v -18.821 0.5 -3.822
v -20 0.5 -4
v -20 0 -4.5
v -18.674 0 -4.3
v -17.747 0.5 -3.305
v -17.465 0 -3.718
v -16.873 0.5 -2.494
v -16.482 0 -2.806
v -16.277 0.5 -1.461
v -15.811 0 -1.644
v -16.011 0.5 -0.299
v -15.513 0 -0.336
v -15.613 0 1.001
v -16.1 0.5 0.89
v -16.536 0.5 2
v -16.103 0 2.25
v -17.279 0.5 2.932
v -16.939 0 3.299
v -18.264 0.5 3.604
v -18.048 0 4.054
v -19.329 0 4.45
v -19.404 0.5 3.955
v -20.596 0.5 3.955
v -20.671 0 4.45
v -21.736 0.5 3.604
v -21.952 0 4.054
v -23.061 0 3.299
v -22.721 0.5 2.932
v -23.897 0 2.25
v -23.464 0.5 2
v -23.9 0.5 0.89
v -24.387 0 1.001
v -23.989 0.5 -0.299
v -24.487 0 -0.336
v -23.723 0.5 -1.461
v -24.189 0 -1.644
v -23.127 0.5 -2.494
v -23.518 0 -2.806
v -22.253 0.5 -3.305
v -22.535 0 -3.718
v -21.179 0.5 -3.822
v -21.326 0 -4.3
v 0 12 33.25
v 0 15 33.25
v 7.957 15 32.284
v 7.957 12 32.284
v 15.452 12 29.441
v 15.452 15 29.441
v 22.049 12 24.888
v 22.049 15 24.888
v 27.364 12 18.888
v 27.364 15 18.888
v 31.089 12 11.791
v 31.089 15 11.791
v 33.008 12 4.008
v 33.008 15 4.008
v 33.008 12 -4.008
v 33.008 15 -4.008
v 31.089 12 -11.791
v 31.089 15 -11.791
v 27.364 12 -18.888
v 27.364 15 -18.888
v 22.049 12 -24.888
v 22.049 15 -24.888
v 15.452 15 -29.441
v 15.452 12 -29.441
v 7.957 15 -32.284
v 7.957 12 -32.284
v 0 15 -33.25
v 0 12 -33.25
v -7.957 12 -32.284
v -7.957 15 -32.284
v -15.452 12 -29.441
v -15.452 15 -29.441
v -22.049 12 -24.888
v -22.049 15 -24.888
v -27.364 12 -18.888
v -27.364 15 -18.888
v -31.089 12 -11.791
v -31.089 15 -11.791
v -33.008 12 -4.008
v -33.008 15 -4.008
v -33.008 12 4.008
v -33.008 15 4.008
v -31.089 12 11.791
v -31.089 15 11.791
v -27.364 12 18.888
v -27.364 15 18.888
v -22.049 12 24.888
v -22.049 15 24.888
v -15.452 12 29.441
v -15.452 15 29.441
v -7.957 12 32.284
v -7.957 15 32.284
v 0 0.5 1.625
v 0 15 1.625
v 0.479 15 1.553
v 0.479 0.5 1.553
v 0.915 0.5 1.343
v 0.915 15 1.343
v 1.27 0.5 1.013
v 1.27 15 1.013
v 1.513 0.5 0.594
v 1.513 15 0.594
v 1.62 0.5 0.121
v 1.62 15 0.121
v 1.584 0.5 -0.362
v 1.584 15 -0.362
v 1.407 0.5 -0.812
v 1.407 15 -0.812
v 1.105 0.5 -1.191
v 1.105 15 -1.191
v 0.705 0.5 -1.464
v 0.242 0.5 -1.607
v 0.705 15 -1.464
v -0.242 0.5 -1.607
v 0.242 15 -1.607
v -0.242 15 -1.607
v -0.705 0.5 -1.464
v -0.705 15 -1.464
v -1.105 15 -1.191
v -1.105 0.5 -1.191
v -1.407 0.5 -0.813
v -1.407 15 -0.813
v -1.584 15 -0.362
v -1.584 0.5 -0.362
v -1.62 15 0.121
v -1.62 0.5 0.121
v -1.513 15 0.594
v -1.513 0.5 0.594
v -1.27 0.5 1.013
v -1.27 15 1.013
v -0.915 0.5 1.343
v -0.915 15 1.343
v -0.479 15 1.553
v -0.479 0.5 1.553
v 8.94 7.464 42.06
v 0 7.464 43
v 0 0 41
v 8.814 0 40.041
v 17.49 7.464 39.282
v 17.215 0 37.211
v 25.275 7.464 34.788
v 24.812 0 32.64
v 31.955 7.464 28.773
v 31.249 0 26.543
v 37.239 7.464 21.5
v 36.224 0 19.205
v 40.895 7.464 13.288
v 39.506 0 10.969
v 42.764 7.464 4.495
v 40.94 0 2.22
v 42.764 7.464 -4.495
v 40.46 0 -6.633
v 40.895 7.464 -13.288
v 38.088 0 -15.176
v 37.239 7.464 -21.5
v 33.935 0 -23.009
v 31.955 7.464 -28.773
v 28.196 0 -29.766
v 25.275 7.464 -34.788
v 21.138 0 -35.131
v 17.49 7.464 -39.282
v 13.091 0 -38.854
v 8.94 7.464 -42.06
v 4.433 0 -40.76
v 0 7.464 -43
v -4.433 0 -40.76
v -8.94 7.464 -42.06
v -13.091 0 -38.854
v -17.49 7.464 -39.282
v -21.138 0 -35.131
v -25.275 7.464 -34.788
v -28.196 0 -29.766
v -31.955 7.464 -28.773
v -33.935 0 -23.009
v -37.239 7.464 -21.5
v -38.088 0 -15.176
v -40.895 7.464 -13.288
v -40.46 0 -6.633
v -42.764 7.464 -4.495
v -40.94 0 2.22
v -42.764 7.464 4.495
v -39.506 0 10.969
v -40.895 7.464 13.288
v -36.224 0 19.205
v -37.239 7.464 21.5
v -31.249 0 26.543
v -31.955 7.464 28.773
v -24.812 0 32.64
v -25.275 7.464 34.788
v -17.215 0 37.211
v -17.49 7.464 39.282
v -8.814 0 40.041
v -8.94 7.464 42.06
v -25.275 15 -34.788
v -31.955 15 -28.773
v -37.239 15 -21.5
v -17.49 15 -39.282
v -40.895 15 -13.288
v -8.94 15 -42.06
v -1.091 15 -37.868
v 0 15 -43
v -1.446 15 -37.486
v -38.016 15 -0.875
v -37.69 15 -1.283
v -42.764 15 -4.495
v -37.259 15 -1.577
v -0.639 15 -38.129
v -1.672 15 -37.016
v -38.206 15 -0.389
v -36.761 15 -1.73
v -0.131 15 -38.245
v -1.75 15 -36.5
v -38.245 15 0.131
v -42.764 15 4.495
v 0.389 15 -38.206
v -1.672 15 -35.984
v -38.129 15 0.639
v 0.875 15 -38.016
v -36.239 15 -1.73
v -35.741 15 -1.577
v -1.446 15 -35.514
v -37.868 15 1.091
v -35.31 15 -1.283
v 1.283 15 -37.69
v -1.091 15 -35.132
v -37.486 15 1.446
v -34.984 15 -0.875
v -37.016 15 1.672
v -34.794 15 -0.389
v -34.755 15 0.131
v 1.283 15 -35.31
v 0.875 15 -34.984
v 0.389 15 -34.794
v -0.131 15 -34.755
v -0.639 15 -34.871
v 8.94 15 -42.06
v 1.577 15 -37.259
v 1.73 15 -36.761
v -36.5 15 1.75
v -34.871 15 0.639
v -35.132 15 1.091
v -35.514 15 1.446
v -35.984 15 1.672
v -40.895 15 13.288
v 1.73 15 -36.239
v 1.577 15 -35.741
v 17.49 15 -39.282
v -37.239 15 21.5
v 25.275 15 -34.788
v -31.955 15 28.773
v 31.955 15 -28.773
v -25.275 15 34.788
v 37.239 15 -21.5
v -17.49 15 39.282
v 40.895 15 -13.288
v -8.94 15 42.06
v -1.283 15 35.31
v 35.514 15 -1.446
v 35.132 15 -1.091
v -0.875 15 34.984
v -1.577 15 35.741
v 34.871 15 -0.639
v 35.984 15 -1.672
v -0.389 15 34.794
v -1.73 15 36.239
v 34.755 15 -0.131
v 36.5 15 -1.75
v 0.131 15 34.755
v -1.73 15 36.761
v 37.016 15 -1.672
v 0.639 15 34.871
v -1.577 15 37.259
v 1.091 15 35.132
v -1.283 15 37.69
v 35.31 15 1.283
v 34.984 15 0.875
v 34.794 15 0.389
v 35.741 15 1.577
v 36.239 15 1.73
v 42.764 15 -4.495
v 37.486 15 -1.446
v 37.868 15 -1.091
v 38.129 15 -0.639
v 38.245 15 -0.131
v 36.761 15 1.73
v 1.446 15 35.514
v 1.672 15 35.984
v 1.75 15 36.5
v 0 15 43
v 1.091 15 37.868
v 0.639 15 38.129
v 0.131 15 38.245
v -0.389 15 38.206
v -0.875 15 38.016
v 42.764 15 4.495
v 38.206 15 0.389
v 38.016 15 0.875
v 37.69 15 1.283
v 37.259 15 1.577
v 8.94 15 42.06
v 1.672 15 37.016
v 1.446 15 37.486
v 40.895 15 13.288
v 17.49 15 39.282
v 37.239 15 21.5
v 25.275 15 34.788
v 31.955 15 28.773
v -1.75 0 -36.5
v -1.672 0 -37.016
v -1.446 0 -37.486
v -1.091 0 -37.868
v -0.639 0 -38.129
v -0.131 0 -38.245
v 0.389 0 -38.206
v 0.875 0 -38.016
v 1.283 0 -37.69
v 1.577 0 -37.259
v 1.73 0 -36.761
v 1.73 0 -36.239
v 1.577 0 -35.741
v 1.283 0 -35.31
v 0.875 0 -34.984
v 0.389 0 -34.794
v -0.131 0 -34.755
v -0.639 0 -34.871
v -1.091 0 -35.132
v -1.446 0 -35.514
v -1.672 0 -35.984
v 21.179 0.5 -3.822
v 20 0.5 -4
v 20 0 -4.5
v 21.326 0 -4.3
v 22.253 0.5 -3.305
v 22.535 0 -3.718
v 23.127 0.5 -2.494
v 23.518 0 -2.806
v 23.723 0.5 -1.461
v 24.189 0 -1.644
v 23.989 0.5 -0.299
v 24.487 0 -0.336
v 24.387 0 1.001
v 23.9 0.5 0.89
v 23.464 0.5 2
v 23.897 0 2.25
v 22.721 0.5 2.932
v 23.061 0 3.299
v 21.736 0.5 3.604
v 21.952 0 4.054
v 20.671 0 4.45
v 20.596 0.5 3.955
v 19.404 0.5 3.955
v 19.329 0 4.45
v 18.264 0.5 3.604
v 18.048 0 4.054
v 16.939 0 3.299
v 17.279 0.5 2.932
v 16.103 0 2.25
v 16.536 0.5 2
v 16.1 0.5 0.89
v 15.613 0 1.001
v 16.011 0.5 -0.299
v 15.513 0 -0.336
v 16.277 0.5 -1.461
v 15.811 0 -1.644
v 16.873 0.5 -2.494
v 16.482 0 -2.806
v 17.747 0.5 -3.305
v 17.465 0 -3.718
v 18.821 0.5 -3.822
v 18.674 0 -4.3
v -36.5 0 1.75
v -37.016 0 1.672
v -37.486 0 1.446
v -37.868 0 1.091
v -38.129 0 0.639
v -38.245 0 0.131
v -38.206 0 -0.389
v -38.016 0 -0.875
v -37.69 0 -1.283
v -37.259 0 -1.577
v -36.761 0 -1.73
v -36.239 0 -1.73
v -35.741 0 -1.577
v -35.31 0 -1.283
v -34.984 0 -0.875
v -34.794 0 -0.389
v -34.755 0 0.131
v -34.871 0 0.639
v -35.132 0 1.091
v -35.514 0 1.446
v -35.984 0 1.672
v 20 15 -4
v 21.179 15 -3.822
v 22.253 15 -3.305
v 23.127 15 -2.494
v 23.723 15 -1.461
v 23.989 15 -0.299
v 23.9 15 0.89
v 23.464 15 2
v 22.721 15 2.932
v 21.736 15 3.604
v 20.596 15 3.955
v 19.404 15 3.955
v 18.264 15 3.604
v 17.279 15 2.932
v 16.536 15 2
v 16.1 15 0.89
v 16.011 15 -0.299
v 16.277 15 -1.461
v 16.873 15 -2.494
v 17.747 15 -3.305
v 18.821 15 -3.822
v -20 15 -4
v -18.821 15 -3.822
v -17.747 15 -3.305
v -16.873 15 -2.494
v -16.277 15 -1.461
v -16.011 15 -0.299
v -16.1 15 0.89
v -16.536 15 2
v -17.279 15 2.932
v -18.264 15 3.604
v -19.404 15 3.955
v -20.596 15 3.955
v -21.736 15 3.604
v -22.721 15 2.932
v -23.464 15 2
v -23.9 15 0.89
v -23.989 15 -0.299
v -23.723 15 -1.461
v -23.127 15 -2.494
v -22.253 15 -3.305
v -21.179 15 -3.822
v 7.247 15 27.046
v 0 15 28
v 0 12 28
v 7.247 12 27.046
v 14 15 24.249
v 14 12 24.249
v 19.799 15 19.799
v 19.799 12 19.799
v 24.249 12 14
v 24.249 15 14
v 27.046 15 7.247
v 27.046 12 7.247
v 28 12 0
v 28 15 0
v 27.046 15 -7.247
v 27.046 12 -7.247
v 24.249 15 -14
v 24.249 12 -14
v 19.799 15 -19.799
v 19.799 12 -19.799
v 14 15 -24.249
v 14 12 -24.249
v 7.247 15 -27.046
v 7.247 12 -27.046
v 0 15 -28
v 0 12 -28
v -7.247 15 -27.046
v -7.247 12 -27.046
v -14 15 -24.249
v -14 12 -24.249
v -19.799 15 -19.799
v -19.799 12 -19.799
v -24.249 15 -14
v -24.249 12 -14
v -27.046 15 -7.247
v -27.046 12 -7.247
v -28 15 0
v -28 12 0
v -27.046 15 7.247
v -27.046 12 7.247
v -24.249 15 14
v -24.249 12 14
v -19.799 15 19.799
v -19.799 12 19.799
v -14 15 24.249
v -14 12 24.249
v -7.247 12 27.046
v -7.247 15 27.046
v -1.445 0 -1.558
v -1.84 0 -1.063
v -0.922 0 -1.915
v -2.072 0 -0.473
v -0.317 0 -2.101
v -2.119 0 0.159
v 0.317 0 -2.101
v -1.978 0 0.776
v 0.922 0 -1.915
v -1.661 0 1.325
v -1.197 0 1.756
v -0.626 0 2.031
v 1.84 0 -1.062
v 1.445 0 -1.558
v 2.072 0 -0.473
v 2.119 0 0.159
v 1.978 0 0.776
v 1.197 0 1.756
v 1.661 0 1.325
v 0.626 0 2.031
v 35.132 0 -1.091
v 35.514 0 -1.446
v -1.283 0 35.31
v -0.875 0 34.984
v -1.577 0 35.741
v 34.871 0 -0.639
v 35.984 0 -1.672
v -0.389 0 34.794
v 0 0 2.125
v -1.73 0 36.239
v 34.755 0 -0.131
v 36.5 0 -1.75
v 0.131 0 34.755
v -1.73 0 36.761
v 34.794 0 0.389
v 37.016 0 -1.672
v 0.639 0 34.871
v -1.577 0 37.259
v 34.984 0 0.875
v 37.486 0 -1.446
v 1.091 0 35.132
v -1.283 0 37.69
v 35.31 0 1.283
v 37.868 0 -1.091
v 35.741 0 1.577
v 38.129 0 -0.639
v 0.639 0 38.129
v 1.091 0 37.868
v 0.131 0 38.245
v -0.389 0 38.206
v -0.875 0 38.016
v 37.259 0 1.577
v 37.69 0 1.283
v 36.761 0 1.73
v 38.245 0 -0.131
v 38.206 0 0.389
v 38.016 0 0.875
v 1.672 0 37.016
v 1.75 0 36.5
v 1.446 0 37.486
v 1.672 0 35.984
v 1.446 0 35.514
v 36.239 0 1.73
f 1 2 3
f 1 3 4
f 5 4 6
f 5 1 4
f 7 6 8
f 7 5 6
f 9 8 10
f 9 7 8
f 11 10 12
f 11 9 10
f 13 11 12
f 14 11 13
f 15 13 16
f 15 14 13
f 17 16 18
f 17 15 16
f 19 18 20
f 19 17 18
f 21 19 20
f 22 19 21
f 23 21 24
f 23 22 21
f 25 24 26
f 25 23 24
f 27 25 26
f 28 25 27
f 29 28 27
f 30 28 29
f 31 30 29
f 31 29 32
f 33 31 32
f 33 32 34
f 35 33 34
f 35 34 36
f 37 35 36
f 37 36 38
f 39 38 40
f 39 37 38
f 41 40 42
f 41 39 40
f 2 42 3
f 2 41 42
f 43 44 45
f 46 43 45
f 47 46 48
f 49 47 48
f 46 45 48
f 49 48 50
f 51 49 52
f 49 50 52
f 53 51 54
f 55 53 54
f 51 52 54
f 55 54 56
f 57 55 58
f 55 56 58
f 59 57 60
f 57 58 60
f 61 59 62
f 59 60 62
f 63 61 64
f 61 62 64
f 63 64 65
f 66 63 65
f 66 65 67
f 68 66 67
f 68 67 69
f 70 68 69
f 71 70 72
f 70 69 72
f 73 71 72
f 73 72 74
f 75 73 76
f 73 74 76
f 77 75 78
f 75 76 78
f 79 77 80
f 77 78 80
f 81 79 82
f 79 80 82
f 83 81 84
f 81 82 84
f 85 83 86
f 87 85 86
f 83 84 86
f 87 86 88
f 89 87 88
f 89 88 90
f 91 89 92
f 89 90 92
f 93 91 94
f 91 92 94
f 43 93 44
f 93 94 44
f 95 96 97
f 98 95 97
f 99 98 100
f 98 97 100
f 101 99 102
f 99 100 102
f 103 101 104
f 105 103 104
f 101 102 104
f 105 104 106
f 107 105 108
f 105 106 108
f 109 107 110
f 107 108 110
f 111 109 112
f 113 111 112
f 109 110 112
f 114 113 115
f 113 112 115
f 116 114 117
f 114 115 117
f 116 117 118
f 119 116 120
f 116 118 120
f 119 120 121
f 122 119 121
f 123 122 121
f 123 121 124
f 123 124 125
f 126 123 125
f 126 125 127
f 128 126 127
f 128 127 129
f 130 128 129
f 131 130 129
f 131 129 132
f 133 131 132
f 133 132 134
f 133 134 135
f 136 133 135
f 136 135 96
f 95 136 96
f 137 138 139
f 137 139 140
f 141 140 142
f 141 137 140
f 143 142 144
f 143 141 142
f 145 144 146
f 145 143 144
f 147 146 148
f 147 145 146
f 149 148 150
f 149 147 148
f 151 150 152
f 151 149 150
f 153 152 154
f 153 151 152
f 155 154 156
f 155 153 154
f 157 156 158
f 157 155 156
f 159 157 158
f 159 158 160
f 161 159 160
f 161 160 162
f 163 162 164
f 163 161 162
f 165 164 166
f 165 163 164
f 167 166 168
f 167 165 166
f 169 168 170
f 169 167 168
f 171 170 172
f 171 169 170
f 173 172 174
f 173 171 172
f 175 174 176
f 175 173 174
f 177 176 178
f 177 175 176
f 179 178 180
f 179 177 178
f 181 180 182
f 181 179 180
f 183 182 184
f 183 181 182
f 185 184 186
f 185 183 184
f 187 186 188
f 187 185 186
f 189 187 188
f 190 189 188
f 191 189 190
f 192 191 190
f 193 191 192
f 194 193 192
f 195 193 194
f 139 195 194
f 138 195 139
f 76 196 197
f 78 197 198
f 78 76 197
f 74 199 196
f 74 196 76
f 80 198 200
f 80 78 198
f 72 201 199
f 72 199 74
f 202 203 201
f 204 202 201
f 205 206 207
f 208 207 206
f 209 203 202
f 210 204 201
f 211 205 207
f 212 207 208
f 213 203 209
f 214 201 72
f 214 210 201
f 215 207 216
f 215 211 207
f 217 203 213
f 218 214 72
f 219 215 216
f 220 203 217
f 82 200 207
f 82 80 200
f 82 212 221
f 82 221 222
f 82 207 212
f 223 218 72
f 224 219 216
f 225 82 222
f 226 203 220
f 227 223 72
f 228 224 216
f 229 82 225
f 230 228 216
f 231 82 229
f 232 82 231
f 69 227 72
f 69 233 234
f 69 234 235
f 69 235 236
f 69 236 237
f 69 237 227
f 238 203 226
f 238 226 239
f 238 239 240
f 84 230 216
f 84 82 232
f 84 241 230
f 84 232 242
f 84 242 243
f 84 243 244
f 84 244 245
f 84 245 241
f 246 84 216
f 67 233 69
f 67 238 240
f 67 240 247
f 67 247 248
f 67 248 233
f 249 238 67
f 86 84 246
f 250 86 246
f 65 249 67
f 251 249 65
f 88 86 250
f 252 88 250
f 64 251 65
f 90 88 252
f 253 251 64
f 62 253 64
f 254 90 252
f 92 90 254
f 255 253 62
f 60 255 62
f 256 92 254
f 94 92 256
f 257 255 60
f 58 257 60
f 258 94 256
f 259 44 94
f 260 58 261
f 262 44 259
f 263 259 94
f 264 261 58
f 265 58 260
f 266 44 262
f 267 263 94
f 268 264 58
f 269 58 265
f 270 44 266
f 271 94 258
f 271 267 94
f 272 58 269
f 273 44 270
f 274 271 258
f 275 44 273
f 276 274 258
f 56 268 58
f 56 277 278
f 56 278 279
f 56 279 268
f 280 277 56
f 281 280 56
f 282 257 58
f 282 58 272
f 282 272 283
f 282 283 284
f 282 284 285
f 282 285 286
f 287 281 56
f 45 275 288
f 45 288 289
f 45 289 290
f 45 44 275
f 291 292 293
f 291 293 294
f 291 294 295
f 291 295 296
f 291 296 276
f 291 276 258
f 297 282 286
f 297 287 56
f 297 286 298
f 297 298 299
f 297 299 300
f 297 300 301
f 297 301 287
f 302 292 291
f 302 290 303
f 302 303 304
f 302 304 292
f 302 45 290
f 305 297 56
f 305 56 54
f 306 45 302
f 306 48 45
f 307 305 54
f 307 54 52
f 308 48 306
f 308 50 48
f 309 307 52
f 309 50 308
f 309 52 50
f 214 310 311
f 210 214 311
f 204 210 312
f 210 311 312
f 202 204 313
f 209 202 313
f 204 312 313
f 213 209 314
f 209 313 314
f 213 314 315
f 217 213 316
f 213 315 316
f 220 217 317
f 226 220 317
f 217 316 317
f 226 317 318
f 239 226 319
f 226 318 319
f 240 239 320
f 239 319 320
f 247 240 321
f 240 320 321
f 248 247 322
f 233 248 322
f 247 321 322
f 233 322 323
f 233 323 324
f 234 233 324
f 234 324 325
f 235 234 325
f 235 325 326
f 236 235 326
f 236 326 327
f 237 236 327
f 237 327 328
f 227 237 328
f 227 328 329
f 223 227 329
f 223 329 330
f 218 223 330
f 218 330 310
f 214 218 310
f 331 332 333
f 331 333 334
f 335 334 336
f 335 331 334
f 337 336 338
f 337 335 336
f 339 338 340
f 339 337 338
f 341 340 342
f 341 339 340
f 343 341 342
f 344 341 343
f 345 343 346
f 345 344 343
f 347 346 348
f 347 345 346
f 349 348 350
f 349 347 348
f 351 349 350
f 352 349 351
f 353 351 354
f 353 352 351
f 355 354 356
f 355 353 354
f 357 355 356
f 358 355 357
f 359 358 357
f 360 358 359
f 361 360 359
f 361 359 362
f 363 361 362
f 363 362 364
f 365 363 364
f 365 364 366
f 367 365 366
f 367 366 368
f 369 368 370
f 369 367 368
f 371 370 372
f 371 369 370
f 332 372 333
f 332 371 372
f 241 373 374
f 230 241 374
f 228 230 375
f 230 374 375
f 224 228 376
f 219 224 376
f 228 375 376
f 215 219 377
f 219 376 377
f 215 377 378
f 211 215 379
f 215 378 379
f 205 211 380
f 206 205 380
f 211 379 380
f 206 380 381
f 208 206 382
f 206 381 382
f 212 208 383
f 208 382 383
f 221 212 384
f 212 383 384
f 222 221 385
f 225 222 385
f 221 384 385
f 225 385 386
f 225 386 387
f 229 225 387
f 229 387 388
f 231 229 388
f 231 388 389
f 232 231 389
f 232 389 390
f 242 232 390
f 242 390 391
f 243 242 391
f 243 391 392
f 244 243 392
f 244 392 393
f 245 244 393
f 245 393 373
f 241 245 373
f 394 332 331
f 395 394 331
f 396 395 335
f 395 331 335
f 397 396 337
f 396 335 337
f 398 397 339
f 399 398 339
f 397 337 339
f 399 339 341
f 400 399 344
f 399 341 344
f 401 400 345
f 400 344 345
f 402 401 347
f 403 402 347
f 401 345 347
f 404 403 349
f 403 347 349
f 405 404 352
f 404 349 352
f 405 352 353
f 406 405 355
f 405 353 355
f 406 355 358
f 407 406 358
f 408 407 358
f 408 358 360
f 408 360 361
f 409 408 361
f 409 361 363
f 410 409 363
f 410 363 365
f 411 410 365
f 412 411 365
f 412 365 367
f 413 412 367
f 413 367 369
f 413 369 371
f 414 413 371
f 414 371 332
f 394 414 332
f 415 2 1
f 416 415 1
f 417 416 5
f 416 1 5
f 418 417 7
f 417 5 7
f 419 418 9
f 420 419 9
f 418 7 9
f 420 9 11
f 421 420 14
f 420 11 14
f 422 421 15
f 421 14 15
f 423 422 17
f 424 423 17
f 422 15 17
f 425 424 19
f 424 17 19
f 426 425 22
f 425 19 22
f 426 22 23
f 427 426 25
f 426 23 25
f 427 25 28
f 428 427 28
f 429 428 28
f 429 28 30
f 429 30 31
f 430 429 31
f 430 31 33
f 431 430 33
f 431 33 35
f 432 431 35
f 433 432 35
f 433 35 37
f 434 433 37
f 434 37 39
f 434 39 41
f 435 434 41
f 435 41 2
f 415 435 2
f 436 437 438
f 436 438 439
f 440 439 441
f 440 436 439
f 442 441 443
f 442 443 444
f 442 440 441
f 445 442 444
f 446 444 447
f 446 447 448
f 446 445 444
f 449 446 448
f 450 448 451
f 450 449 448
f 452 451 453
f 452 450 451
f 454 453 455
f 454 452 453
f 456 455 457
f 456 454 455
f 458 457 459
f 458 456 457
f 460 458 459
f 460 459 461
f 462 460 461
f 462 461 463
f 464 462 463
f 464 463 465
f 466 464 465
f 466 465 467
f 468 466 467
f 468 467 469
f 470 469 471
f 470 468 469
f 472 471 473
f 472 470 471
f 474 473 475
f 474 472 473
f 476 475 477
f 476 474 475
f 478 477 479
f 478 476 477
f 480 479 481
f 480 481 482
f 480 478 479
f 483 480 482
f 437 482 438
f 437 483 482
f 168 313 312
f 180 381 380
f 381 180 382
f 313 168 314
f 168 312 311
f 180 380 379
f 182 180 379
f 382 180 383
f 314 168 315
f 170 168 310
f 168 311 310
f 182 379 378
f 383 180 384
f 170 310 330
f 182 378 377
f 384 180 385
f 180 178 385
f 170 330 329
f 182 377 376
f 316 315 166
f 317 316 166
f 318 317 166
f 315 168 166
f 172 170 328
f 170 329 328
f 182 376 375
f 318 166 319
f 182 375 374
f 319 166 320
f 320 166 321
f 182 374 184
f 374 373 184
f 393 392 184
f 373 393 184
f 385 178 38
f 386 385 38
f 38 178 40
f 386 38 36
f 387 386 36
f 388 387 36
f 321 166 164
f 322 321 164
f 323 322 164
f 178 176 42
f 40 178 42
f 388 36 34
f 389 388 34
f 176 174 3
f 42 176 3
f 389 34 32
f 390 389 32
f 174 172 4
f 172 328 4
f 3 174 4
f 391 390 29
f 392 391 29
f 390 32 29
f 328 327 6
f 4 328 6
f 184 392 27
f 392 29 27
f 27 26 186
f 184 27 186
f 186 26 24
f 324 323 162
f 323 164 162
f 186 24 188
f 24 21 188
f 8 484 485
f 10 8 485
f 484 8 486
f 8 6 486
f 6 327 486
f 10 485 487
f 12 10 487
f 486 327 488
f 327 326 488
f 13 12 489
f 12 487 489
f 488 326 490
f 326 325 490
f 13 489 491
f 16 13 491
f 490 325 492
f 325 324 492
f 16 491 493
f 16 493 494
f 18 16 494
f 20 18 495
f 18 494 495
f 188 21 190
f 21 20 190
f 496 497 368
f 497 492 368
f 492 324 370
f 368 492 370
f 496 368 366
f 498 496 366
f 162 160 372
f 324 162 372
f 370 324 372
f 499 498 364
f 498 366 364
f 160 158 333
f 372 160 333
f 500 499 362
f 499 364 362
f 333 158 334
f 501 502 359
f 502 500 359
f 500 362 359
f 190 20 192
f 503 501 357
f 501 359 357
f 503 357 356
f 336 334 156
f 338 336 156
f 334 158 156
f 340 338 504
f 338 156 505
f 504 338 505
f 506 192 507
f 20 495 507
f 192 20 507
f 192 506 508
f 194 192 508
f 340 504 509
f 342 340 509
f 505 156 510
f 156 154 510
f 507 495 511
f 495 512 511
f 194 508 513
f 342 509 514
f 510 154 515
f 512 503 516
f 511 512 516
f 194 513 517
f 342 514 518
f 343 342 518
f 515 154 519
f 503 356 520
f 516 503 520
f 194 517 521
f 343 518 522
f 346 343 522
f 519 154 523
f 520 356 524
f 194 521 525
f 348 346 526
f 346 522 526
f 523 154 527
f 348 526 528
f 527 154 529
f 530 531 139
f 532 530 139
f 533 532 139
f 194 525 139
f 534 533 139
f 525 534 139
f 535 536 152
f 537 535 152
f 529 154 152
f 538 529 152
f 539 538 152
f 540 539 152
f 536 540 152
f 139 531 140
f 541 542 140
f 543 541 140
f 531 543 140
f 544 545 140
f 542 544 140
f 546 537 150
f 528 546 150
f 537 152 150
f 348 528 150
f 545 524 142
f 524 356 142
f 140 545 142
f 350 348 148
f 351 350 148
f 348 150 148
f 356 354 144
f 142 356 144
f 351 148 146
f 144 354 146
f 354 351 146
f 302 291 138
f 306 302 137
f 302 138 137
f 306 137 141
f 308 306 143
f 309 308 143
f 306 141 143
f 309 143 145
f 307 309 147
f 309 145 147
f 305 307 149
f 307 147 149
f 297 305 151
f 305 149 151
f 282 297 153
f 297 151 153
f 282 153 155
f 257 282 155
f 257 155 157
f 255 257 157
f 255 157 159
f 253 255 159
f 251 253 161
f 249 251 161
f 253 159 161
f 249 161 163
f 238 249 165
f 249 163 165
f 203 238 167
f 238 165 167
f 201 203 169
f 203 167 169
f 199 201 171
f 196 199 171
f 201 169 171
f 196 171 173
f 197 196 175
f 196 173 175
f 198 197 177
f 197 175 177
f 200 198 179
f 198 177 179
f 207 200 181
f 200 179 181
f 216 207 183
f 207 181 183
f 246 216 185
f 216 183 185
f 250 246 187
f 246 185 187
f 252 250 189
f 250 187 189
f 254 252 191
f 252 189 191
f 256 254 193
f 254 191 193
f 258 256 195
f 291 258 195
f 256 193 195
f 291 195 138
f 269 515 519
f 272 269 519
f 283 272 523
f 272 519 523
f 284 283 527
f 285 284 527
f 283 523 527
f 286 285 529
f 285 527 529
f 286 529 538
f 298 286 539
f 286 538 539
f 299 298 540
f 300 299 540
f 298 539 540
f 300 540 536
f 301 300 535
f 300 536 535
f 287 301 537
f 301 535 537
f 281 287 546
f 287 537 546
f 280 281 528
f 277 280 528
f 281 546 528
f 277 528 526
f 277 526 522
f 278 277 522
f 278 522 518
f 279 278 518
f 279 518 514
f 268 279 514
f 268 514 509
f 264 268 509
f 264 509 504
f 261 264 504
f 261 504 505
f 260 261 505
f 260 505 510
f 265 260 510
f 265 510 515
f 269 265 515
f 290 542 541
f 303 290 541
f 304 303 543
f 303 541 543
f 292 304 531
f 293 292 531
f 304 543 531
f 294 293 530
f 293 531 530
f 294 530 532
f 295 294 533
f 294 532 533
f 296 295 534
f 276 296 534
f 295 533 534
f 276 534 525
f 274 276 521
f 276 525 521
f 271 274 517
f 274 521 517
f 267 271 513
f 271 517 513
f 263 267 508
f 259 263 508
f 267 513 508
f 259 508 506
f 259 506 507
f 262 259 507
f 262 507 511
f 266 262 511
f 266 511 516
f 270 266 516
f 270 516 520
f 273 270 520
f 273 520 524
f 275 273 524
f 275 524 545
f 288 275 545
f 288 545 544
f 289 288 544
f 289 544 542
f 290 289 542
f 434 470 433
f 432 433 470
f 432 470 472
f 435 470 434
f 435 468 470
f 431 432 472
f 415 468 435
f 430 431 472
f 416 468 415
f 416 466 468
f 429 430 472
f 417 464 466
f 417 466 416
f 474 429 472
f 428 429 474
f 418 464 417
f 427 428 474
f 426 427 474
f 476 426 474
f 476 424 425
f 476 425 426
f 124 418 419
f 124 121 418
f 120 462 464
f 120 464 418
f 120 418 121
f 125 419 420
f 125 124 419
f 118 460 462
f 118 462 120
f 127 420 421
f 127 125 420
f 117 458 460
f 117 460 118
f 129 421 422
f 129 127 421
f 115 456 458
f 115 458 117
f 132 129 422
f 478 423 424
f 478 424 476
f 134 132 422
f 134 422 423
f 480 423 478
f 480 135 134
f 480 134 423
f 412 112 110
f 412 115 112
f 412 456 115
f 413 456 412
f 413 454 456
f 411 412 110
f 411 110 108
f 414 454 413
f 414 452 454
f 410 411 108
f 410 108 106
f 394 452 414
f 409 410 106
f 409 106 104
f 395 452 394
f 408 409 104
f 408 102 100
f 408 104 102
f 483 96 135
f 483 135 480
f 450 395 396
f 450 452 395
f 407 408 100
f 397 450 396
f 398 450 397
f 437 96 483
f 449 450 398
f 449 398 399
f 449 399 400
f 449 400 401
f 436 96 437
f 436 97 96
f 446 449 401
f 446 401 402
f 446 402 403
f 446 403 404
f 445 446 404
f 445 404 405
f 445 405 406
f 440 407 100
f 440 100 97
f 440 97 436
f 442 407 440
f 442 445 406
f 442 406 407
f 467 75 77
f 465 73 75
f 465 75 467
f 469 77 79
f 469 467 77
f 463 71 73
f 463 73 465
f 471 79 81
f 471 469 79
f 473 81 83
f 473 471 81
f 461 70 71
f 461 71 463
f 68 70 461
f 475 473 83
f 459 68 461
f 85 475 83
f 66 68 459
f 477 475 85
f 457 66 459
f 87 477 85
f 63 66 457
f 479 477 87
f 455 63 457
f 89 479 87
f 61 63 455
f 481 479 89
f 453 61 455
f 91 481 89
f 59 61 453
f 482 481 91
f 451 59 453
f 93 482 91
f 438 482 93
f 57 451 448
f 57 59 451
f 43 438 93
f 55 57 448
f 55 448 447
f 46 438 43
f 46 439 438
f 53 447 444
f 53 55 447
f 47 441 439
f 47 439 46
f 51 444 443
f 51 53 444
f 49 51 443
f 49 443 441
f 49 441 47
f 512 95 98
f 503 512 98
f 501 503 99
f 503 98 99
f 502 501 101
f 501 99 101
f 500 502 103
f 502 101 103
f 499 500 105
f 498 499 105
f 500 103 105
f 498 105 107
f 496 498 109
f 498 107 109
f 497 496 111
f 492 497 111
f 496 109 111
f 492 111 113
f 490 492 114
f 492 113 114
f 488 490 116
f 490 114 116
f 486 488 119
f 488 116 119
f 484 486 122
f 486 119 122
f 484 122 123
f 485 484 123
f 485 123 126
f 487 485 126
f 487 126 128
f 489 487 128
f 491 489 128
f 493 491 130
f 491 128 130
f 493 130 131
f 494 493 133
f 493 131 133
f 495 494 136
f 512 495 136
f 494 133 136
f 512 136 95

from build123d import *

# Parameters (mm, degrees)
SKETCH1_R           = 43
BOSS_EXTRUDE1_DEPTH = 15
SKETCH2_R           = 4
CUT_EXTRUDE1_DEPTH  = 63.633856659
SKETCH3_R           = 1.625
CUT_EXTRUDE2_DEPTH  = 63.633856659
SKETCH4_R           = 33.25
SKETCH4_R_2         = 28
CUT_EXTRUDE3_DEPTH  = 3
SKETCH5_R           = 1.75
CUT_EXTRUDE4_DEPTH  = 63.633856659
CIRPATTERN1_COUNT   = 4
CHAMFER1_SIZE       = 2
CHAMFER1_SIZE2      = 7.464101615
CHAMFER2_SIZE       = 0.5


with BuildPart() as part:
    # Sketch1 → Boss-Extrude1 (new body)
    with BuildSketch(Plane(origin=(0, 0, 0), x_dir=(1, 0, 0), z_dir=(0, 1, 0))):
        with Locations(Location((0, 0, 0), (0, 0, 270))):
            Circle(SKETCH1_R)
    extrude(amount=BOSS_EXTRUDE1_DEPTH)

    # Sketch2 → Cut-Extrude1 (cut, through all)
    with BuildSketch(Plane.XZ):
        with Locations(Location((20, 0, 0), (0, 0, 270))):
            Circle(SKETCH2_R)
        with Locations(Location((-20, 0, 0), (0, 0, 270))):
            Circle(SKETCH2_R)
    extrude(amount=-CUT_EXTRUDE1_DEPTH, mode=Mode.SUBTRACT)

    # Sketch3 → Cut-Extrude2 (cut, through all)
    with BuildSketch(Plane(origin=(0, 15, 0), x_dir=(1, 0, 0), z_dir=(0, 1, 0))):
        with Locations(Location((0, 0, 0), (0, 0, 270))):
            Circle(SKETCH3_R)
    extrude(amount=-CUT_EXTRUDE2_DEPTH, mode=Mode.SUBTRACT)

    # Sketch4 → Cut-Extrude3 (cut)
    with BuildSketch(Plane(origin=(0, 15, 0), x_dir=(1, 0, 0), z_dir=(0, 1, 0))):
        with Locations(Location((0, 0, 0), (0, 0, 270))):
            Circle(SKETCH4_R)
        with Locations(Location((0, 0, 0), (0, 0, 270))):
            Circle(SKETCH4_R_2, mode=Mode.SUBTRACT)
    extrude(amount=-CUT_EXTRUDE3_DEPTH, mode=Mode.SUBTRACT)

    # Sketch5 → Cut-Extrude4 (cut, through all)
    with BuildSketch(Plane.XZ):
        with Locations(Location((36.5, 0, 0), (0, 0, 270))):
            Circle(SKETCH5_R)
    cut_extrude4 = extrude(amount=-CUT_EXTRUDE4_DEPTH, mode=Mode.SUBTRACT)

    # CirPattern1: Cut-Extrude4 ×4 about axis
    cirpattern1_axis = Axis((0, 0, 0), (0, 1, 0))
    for i in range(1, CIRPATTERN1_COUNT):
        add(cut_extrude4.rotate(cirpattern1_axis, i * 360 / CIRPATTERN1_COUNT), mode=Mode.SUBTRACT)

    # Chamfer1
    chamfer1_edges = [part.edges().sort_by_distance(p)[0] for p in [
        (0, 0, -43),
    ]]
    chamfer1_side = [part.faces().sort_by_distance(p)[0] for p in [
        (0, 0, -41.783776336),
    ]]
    chamfer(chamfer1_edges, length=CHAMFER1_SIZE, length2=CHAMFER1_SIZE2, reference=chamfer1_side[0])

    # Chamfer2
    chamfer2_edges = [part.edges().sort_by_distance(p)[0] for p in [
        (-20, 0, 4),
        (0, 0, -1.625),
        (20, 0, 4),
    ]]
    chamfer(chamfer2_edges, length=CHAMFER2_SIZE)


solid = part.part
